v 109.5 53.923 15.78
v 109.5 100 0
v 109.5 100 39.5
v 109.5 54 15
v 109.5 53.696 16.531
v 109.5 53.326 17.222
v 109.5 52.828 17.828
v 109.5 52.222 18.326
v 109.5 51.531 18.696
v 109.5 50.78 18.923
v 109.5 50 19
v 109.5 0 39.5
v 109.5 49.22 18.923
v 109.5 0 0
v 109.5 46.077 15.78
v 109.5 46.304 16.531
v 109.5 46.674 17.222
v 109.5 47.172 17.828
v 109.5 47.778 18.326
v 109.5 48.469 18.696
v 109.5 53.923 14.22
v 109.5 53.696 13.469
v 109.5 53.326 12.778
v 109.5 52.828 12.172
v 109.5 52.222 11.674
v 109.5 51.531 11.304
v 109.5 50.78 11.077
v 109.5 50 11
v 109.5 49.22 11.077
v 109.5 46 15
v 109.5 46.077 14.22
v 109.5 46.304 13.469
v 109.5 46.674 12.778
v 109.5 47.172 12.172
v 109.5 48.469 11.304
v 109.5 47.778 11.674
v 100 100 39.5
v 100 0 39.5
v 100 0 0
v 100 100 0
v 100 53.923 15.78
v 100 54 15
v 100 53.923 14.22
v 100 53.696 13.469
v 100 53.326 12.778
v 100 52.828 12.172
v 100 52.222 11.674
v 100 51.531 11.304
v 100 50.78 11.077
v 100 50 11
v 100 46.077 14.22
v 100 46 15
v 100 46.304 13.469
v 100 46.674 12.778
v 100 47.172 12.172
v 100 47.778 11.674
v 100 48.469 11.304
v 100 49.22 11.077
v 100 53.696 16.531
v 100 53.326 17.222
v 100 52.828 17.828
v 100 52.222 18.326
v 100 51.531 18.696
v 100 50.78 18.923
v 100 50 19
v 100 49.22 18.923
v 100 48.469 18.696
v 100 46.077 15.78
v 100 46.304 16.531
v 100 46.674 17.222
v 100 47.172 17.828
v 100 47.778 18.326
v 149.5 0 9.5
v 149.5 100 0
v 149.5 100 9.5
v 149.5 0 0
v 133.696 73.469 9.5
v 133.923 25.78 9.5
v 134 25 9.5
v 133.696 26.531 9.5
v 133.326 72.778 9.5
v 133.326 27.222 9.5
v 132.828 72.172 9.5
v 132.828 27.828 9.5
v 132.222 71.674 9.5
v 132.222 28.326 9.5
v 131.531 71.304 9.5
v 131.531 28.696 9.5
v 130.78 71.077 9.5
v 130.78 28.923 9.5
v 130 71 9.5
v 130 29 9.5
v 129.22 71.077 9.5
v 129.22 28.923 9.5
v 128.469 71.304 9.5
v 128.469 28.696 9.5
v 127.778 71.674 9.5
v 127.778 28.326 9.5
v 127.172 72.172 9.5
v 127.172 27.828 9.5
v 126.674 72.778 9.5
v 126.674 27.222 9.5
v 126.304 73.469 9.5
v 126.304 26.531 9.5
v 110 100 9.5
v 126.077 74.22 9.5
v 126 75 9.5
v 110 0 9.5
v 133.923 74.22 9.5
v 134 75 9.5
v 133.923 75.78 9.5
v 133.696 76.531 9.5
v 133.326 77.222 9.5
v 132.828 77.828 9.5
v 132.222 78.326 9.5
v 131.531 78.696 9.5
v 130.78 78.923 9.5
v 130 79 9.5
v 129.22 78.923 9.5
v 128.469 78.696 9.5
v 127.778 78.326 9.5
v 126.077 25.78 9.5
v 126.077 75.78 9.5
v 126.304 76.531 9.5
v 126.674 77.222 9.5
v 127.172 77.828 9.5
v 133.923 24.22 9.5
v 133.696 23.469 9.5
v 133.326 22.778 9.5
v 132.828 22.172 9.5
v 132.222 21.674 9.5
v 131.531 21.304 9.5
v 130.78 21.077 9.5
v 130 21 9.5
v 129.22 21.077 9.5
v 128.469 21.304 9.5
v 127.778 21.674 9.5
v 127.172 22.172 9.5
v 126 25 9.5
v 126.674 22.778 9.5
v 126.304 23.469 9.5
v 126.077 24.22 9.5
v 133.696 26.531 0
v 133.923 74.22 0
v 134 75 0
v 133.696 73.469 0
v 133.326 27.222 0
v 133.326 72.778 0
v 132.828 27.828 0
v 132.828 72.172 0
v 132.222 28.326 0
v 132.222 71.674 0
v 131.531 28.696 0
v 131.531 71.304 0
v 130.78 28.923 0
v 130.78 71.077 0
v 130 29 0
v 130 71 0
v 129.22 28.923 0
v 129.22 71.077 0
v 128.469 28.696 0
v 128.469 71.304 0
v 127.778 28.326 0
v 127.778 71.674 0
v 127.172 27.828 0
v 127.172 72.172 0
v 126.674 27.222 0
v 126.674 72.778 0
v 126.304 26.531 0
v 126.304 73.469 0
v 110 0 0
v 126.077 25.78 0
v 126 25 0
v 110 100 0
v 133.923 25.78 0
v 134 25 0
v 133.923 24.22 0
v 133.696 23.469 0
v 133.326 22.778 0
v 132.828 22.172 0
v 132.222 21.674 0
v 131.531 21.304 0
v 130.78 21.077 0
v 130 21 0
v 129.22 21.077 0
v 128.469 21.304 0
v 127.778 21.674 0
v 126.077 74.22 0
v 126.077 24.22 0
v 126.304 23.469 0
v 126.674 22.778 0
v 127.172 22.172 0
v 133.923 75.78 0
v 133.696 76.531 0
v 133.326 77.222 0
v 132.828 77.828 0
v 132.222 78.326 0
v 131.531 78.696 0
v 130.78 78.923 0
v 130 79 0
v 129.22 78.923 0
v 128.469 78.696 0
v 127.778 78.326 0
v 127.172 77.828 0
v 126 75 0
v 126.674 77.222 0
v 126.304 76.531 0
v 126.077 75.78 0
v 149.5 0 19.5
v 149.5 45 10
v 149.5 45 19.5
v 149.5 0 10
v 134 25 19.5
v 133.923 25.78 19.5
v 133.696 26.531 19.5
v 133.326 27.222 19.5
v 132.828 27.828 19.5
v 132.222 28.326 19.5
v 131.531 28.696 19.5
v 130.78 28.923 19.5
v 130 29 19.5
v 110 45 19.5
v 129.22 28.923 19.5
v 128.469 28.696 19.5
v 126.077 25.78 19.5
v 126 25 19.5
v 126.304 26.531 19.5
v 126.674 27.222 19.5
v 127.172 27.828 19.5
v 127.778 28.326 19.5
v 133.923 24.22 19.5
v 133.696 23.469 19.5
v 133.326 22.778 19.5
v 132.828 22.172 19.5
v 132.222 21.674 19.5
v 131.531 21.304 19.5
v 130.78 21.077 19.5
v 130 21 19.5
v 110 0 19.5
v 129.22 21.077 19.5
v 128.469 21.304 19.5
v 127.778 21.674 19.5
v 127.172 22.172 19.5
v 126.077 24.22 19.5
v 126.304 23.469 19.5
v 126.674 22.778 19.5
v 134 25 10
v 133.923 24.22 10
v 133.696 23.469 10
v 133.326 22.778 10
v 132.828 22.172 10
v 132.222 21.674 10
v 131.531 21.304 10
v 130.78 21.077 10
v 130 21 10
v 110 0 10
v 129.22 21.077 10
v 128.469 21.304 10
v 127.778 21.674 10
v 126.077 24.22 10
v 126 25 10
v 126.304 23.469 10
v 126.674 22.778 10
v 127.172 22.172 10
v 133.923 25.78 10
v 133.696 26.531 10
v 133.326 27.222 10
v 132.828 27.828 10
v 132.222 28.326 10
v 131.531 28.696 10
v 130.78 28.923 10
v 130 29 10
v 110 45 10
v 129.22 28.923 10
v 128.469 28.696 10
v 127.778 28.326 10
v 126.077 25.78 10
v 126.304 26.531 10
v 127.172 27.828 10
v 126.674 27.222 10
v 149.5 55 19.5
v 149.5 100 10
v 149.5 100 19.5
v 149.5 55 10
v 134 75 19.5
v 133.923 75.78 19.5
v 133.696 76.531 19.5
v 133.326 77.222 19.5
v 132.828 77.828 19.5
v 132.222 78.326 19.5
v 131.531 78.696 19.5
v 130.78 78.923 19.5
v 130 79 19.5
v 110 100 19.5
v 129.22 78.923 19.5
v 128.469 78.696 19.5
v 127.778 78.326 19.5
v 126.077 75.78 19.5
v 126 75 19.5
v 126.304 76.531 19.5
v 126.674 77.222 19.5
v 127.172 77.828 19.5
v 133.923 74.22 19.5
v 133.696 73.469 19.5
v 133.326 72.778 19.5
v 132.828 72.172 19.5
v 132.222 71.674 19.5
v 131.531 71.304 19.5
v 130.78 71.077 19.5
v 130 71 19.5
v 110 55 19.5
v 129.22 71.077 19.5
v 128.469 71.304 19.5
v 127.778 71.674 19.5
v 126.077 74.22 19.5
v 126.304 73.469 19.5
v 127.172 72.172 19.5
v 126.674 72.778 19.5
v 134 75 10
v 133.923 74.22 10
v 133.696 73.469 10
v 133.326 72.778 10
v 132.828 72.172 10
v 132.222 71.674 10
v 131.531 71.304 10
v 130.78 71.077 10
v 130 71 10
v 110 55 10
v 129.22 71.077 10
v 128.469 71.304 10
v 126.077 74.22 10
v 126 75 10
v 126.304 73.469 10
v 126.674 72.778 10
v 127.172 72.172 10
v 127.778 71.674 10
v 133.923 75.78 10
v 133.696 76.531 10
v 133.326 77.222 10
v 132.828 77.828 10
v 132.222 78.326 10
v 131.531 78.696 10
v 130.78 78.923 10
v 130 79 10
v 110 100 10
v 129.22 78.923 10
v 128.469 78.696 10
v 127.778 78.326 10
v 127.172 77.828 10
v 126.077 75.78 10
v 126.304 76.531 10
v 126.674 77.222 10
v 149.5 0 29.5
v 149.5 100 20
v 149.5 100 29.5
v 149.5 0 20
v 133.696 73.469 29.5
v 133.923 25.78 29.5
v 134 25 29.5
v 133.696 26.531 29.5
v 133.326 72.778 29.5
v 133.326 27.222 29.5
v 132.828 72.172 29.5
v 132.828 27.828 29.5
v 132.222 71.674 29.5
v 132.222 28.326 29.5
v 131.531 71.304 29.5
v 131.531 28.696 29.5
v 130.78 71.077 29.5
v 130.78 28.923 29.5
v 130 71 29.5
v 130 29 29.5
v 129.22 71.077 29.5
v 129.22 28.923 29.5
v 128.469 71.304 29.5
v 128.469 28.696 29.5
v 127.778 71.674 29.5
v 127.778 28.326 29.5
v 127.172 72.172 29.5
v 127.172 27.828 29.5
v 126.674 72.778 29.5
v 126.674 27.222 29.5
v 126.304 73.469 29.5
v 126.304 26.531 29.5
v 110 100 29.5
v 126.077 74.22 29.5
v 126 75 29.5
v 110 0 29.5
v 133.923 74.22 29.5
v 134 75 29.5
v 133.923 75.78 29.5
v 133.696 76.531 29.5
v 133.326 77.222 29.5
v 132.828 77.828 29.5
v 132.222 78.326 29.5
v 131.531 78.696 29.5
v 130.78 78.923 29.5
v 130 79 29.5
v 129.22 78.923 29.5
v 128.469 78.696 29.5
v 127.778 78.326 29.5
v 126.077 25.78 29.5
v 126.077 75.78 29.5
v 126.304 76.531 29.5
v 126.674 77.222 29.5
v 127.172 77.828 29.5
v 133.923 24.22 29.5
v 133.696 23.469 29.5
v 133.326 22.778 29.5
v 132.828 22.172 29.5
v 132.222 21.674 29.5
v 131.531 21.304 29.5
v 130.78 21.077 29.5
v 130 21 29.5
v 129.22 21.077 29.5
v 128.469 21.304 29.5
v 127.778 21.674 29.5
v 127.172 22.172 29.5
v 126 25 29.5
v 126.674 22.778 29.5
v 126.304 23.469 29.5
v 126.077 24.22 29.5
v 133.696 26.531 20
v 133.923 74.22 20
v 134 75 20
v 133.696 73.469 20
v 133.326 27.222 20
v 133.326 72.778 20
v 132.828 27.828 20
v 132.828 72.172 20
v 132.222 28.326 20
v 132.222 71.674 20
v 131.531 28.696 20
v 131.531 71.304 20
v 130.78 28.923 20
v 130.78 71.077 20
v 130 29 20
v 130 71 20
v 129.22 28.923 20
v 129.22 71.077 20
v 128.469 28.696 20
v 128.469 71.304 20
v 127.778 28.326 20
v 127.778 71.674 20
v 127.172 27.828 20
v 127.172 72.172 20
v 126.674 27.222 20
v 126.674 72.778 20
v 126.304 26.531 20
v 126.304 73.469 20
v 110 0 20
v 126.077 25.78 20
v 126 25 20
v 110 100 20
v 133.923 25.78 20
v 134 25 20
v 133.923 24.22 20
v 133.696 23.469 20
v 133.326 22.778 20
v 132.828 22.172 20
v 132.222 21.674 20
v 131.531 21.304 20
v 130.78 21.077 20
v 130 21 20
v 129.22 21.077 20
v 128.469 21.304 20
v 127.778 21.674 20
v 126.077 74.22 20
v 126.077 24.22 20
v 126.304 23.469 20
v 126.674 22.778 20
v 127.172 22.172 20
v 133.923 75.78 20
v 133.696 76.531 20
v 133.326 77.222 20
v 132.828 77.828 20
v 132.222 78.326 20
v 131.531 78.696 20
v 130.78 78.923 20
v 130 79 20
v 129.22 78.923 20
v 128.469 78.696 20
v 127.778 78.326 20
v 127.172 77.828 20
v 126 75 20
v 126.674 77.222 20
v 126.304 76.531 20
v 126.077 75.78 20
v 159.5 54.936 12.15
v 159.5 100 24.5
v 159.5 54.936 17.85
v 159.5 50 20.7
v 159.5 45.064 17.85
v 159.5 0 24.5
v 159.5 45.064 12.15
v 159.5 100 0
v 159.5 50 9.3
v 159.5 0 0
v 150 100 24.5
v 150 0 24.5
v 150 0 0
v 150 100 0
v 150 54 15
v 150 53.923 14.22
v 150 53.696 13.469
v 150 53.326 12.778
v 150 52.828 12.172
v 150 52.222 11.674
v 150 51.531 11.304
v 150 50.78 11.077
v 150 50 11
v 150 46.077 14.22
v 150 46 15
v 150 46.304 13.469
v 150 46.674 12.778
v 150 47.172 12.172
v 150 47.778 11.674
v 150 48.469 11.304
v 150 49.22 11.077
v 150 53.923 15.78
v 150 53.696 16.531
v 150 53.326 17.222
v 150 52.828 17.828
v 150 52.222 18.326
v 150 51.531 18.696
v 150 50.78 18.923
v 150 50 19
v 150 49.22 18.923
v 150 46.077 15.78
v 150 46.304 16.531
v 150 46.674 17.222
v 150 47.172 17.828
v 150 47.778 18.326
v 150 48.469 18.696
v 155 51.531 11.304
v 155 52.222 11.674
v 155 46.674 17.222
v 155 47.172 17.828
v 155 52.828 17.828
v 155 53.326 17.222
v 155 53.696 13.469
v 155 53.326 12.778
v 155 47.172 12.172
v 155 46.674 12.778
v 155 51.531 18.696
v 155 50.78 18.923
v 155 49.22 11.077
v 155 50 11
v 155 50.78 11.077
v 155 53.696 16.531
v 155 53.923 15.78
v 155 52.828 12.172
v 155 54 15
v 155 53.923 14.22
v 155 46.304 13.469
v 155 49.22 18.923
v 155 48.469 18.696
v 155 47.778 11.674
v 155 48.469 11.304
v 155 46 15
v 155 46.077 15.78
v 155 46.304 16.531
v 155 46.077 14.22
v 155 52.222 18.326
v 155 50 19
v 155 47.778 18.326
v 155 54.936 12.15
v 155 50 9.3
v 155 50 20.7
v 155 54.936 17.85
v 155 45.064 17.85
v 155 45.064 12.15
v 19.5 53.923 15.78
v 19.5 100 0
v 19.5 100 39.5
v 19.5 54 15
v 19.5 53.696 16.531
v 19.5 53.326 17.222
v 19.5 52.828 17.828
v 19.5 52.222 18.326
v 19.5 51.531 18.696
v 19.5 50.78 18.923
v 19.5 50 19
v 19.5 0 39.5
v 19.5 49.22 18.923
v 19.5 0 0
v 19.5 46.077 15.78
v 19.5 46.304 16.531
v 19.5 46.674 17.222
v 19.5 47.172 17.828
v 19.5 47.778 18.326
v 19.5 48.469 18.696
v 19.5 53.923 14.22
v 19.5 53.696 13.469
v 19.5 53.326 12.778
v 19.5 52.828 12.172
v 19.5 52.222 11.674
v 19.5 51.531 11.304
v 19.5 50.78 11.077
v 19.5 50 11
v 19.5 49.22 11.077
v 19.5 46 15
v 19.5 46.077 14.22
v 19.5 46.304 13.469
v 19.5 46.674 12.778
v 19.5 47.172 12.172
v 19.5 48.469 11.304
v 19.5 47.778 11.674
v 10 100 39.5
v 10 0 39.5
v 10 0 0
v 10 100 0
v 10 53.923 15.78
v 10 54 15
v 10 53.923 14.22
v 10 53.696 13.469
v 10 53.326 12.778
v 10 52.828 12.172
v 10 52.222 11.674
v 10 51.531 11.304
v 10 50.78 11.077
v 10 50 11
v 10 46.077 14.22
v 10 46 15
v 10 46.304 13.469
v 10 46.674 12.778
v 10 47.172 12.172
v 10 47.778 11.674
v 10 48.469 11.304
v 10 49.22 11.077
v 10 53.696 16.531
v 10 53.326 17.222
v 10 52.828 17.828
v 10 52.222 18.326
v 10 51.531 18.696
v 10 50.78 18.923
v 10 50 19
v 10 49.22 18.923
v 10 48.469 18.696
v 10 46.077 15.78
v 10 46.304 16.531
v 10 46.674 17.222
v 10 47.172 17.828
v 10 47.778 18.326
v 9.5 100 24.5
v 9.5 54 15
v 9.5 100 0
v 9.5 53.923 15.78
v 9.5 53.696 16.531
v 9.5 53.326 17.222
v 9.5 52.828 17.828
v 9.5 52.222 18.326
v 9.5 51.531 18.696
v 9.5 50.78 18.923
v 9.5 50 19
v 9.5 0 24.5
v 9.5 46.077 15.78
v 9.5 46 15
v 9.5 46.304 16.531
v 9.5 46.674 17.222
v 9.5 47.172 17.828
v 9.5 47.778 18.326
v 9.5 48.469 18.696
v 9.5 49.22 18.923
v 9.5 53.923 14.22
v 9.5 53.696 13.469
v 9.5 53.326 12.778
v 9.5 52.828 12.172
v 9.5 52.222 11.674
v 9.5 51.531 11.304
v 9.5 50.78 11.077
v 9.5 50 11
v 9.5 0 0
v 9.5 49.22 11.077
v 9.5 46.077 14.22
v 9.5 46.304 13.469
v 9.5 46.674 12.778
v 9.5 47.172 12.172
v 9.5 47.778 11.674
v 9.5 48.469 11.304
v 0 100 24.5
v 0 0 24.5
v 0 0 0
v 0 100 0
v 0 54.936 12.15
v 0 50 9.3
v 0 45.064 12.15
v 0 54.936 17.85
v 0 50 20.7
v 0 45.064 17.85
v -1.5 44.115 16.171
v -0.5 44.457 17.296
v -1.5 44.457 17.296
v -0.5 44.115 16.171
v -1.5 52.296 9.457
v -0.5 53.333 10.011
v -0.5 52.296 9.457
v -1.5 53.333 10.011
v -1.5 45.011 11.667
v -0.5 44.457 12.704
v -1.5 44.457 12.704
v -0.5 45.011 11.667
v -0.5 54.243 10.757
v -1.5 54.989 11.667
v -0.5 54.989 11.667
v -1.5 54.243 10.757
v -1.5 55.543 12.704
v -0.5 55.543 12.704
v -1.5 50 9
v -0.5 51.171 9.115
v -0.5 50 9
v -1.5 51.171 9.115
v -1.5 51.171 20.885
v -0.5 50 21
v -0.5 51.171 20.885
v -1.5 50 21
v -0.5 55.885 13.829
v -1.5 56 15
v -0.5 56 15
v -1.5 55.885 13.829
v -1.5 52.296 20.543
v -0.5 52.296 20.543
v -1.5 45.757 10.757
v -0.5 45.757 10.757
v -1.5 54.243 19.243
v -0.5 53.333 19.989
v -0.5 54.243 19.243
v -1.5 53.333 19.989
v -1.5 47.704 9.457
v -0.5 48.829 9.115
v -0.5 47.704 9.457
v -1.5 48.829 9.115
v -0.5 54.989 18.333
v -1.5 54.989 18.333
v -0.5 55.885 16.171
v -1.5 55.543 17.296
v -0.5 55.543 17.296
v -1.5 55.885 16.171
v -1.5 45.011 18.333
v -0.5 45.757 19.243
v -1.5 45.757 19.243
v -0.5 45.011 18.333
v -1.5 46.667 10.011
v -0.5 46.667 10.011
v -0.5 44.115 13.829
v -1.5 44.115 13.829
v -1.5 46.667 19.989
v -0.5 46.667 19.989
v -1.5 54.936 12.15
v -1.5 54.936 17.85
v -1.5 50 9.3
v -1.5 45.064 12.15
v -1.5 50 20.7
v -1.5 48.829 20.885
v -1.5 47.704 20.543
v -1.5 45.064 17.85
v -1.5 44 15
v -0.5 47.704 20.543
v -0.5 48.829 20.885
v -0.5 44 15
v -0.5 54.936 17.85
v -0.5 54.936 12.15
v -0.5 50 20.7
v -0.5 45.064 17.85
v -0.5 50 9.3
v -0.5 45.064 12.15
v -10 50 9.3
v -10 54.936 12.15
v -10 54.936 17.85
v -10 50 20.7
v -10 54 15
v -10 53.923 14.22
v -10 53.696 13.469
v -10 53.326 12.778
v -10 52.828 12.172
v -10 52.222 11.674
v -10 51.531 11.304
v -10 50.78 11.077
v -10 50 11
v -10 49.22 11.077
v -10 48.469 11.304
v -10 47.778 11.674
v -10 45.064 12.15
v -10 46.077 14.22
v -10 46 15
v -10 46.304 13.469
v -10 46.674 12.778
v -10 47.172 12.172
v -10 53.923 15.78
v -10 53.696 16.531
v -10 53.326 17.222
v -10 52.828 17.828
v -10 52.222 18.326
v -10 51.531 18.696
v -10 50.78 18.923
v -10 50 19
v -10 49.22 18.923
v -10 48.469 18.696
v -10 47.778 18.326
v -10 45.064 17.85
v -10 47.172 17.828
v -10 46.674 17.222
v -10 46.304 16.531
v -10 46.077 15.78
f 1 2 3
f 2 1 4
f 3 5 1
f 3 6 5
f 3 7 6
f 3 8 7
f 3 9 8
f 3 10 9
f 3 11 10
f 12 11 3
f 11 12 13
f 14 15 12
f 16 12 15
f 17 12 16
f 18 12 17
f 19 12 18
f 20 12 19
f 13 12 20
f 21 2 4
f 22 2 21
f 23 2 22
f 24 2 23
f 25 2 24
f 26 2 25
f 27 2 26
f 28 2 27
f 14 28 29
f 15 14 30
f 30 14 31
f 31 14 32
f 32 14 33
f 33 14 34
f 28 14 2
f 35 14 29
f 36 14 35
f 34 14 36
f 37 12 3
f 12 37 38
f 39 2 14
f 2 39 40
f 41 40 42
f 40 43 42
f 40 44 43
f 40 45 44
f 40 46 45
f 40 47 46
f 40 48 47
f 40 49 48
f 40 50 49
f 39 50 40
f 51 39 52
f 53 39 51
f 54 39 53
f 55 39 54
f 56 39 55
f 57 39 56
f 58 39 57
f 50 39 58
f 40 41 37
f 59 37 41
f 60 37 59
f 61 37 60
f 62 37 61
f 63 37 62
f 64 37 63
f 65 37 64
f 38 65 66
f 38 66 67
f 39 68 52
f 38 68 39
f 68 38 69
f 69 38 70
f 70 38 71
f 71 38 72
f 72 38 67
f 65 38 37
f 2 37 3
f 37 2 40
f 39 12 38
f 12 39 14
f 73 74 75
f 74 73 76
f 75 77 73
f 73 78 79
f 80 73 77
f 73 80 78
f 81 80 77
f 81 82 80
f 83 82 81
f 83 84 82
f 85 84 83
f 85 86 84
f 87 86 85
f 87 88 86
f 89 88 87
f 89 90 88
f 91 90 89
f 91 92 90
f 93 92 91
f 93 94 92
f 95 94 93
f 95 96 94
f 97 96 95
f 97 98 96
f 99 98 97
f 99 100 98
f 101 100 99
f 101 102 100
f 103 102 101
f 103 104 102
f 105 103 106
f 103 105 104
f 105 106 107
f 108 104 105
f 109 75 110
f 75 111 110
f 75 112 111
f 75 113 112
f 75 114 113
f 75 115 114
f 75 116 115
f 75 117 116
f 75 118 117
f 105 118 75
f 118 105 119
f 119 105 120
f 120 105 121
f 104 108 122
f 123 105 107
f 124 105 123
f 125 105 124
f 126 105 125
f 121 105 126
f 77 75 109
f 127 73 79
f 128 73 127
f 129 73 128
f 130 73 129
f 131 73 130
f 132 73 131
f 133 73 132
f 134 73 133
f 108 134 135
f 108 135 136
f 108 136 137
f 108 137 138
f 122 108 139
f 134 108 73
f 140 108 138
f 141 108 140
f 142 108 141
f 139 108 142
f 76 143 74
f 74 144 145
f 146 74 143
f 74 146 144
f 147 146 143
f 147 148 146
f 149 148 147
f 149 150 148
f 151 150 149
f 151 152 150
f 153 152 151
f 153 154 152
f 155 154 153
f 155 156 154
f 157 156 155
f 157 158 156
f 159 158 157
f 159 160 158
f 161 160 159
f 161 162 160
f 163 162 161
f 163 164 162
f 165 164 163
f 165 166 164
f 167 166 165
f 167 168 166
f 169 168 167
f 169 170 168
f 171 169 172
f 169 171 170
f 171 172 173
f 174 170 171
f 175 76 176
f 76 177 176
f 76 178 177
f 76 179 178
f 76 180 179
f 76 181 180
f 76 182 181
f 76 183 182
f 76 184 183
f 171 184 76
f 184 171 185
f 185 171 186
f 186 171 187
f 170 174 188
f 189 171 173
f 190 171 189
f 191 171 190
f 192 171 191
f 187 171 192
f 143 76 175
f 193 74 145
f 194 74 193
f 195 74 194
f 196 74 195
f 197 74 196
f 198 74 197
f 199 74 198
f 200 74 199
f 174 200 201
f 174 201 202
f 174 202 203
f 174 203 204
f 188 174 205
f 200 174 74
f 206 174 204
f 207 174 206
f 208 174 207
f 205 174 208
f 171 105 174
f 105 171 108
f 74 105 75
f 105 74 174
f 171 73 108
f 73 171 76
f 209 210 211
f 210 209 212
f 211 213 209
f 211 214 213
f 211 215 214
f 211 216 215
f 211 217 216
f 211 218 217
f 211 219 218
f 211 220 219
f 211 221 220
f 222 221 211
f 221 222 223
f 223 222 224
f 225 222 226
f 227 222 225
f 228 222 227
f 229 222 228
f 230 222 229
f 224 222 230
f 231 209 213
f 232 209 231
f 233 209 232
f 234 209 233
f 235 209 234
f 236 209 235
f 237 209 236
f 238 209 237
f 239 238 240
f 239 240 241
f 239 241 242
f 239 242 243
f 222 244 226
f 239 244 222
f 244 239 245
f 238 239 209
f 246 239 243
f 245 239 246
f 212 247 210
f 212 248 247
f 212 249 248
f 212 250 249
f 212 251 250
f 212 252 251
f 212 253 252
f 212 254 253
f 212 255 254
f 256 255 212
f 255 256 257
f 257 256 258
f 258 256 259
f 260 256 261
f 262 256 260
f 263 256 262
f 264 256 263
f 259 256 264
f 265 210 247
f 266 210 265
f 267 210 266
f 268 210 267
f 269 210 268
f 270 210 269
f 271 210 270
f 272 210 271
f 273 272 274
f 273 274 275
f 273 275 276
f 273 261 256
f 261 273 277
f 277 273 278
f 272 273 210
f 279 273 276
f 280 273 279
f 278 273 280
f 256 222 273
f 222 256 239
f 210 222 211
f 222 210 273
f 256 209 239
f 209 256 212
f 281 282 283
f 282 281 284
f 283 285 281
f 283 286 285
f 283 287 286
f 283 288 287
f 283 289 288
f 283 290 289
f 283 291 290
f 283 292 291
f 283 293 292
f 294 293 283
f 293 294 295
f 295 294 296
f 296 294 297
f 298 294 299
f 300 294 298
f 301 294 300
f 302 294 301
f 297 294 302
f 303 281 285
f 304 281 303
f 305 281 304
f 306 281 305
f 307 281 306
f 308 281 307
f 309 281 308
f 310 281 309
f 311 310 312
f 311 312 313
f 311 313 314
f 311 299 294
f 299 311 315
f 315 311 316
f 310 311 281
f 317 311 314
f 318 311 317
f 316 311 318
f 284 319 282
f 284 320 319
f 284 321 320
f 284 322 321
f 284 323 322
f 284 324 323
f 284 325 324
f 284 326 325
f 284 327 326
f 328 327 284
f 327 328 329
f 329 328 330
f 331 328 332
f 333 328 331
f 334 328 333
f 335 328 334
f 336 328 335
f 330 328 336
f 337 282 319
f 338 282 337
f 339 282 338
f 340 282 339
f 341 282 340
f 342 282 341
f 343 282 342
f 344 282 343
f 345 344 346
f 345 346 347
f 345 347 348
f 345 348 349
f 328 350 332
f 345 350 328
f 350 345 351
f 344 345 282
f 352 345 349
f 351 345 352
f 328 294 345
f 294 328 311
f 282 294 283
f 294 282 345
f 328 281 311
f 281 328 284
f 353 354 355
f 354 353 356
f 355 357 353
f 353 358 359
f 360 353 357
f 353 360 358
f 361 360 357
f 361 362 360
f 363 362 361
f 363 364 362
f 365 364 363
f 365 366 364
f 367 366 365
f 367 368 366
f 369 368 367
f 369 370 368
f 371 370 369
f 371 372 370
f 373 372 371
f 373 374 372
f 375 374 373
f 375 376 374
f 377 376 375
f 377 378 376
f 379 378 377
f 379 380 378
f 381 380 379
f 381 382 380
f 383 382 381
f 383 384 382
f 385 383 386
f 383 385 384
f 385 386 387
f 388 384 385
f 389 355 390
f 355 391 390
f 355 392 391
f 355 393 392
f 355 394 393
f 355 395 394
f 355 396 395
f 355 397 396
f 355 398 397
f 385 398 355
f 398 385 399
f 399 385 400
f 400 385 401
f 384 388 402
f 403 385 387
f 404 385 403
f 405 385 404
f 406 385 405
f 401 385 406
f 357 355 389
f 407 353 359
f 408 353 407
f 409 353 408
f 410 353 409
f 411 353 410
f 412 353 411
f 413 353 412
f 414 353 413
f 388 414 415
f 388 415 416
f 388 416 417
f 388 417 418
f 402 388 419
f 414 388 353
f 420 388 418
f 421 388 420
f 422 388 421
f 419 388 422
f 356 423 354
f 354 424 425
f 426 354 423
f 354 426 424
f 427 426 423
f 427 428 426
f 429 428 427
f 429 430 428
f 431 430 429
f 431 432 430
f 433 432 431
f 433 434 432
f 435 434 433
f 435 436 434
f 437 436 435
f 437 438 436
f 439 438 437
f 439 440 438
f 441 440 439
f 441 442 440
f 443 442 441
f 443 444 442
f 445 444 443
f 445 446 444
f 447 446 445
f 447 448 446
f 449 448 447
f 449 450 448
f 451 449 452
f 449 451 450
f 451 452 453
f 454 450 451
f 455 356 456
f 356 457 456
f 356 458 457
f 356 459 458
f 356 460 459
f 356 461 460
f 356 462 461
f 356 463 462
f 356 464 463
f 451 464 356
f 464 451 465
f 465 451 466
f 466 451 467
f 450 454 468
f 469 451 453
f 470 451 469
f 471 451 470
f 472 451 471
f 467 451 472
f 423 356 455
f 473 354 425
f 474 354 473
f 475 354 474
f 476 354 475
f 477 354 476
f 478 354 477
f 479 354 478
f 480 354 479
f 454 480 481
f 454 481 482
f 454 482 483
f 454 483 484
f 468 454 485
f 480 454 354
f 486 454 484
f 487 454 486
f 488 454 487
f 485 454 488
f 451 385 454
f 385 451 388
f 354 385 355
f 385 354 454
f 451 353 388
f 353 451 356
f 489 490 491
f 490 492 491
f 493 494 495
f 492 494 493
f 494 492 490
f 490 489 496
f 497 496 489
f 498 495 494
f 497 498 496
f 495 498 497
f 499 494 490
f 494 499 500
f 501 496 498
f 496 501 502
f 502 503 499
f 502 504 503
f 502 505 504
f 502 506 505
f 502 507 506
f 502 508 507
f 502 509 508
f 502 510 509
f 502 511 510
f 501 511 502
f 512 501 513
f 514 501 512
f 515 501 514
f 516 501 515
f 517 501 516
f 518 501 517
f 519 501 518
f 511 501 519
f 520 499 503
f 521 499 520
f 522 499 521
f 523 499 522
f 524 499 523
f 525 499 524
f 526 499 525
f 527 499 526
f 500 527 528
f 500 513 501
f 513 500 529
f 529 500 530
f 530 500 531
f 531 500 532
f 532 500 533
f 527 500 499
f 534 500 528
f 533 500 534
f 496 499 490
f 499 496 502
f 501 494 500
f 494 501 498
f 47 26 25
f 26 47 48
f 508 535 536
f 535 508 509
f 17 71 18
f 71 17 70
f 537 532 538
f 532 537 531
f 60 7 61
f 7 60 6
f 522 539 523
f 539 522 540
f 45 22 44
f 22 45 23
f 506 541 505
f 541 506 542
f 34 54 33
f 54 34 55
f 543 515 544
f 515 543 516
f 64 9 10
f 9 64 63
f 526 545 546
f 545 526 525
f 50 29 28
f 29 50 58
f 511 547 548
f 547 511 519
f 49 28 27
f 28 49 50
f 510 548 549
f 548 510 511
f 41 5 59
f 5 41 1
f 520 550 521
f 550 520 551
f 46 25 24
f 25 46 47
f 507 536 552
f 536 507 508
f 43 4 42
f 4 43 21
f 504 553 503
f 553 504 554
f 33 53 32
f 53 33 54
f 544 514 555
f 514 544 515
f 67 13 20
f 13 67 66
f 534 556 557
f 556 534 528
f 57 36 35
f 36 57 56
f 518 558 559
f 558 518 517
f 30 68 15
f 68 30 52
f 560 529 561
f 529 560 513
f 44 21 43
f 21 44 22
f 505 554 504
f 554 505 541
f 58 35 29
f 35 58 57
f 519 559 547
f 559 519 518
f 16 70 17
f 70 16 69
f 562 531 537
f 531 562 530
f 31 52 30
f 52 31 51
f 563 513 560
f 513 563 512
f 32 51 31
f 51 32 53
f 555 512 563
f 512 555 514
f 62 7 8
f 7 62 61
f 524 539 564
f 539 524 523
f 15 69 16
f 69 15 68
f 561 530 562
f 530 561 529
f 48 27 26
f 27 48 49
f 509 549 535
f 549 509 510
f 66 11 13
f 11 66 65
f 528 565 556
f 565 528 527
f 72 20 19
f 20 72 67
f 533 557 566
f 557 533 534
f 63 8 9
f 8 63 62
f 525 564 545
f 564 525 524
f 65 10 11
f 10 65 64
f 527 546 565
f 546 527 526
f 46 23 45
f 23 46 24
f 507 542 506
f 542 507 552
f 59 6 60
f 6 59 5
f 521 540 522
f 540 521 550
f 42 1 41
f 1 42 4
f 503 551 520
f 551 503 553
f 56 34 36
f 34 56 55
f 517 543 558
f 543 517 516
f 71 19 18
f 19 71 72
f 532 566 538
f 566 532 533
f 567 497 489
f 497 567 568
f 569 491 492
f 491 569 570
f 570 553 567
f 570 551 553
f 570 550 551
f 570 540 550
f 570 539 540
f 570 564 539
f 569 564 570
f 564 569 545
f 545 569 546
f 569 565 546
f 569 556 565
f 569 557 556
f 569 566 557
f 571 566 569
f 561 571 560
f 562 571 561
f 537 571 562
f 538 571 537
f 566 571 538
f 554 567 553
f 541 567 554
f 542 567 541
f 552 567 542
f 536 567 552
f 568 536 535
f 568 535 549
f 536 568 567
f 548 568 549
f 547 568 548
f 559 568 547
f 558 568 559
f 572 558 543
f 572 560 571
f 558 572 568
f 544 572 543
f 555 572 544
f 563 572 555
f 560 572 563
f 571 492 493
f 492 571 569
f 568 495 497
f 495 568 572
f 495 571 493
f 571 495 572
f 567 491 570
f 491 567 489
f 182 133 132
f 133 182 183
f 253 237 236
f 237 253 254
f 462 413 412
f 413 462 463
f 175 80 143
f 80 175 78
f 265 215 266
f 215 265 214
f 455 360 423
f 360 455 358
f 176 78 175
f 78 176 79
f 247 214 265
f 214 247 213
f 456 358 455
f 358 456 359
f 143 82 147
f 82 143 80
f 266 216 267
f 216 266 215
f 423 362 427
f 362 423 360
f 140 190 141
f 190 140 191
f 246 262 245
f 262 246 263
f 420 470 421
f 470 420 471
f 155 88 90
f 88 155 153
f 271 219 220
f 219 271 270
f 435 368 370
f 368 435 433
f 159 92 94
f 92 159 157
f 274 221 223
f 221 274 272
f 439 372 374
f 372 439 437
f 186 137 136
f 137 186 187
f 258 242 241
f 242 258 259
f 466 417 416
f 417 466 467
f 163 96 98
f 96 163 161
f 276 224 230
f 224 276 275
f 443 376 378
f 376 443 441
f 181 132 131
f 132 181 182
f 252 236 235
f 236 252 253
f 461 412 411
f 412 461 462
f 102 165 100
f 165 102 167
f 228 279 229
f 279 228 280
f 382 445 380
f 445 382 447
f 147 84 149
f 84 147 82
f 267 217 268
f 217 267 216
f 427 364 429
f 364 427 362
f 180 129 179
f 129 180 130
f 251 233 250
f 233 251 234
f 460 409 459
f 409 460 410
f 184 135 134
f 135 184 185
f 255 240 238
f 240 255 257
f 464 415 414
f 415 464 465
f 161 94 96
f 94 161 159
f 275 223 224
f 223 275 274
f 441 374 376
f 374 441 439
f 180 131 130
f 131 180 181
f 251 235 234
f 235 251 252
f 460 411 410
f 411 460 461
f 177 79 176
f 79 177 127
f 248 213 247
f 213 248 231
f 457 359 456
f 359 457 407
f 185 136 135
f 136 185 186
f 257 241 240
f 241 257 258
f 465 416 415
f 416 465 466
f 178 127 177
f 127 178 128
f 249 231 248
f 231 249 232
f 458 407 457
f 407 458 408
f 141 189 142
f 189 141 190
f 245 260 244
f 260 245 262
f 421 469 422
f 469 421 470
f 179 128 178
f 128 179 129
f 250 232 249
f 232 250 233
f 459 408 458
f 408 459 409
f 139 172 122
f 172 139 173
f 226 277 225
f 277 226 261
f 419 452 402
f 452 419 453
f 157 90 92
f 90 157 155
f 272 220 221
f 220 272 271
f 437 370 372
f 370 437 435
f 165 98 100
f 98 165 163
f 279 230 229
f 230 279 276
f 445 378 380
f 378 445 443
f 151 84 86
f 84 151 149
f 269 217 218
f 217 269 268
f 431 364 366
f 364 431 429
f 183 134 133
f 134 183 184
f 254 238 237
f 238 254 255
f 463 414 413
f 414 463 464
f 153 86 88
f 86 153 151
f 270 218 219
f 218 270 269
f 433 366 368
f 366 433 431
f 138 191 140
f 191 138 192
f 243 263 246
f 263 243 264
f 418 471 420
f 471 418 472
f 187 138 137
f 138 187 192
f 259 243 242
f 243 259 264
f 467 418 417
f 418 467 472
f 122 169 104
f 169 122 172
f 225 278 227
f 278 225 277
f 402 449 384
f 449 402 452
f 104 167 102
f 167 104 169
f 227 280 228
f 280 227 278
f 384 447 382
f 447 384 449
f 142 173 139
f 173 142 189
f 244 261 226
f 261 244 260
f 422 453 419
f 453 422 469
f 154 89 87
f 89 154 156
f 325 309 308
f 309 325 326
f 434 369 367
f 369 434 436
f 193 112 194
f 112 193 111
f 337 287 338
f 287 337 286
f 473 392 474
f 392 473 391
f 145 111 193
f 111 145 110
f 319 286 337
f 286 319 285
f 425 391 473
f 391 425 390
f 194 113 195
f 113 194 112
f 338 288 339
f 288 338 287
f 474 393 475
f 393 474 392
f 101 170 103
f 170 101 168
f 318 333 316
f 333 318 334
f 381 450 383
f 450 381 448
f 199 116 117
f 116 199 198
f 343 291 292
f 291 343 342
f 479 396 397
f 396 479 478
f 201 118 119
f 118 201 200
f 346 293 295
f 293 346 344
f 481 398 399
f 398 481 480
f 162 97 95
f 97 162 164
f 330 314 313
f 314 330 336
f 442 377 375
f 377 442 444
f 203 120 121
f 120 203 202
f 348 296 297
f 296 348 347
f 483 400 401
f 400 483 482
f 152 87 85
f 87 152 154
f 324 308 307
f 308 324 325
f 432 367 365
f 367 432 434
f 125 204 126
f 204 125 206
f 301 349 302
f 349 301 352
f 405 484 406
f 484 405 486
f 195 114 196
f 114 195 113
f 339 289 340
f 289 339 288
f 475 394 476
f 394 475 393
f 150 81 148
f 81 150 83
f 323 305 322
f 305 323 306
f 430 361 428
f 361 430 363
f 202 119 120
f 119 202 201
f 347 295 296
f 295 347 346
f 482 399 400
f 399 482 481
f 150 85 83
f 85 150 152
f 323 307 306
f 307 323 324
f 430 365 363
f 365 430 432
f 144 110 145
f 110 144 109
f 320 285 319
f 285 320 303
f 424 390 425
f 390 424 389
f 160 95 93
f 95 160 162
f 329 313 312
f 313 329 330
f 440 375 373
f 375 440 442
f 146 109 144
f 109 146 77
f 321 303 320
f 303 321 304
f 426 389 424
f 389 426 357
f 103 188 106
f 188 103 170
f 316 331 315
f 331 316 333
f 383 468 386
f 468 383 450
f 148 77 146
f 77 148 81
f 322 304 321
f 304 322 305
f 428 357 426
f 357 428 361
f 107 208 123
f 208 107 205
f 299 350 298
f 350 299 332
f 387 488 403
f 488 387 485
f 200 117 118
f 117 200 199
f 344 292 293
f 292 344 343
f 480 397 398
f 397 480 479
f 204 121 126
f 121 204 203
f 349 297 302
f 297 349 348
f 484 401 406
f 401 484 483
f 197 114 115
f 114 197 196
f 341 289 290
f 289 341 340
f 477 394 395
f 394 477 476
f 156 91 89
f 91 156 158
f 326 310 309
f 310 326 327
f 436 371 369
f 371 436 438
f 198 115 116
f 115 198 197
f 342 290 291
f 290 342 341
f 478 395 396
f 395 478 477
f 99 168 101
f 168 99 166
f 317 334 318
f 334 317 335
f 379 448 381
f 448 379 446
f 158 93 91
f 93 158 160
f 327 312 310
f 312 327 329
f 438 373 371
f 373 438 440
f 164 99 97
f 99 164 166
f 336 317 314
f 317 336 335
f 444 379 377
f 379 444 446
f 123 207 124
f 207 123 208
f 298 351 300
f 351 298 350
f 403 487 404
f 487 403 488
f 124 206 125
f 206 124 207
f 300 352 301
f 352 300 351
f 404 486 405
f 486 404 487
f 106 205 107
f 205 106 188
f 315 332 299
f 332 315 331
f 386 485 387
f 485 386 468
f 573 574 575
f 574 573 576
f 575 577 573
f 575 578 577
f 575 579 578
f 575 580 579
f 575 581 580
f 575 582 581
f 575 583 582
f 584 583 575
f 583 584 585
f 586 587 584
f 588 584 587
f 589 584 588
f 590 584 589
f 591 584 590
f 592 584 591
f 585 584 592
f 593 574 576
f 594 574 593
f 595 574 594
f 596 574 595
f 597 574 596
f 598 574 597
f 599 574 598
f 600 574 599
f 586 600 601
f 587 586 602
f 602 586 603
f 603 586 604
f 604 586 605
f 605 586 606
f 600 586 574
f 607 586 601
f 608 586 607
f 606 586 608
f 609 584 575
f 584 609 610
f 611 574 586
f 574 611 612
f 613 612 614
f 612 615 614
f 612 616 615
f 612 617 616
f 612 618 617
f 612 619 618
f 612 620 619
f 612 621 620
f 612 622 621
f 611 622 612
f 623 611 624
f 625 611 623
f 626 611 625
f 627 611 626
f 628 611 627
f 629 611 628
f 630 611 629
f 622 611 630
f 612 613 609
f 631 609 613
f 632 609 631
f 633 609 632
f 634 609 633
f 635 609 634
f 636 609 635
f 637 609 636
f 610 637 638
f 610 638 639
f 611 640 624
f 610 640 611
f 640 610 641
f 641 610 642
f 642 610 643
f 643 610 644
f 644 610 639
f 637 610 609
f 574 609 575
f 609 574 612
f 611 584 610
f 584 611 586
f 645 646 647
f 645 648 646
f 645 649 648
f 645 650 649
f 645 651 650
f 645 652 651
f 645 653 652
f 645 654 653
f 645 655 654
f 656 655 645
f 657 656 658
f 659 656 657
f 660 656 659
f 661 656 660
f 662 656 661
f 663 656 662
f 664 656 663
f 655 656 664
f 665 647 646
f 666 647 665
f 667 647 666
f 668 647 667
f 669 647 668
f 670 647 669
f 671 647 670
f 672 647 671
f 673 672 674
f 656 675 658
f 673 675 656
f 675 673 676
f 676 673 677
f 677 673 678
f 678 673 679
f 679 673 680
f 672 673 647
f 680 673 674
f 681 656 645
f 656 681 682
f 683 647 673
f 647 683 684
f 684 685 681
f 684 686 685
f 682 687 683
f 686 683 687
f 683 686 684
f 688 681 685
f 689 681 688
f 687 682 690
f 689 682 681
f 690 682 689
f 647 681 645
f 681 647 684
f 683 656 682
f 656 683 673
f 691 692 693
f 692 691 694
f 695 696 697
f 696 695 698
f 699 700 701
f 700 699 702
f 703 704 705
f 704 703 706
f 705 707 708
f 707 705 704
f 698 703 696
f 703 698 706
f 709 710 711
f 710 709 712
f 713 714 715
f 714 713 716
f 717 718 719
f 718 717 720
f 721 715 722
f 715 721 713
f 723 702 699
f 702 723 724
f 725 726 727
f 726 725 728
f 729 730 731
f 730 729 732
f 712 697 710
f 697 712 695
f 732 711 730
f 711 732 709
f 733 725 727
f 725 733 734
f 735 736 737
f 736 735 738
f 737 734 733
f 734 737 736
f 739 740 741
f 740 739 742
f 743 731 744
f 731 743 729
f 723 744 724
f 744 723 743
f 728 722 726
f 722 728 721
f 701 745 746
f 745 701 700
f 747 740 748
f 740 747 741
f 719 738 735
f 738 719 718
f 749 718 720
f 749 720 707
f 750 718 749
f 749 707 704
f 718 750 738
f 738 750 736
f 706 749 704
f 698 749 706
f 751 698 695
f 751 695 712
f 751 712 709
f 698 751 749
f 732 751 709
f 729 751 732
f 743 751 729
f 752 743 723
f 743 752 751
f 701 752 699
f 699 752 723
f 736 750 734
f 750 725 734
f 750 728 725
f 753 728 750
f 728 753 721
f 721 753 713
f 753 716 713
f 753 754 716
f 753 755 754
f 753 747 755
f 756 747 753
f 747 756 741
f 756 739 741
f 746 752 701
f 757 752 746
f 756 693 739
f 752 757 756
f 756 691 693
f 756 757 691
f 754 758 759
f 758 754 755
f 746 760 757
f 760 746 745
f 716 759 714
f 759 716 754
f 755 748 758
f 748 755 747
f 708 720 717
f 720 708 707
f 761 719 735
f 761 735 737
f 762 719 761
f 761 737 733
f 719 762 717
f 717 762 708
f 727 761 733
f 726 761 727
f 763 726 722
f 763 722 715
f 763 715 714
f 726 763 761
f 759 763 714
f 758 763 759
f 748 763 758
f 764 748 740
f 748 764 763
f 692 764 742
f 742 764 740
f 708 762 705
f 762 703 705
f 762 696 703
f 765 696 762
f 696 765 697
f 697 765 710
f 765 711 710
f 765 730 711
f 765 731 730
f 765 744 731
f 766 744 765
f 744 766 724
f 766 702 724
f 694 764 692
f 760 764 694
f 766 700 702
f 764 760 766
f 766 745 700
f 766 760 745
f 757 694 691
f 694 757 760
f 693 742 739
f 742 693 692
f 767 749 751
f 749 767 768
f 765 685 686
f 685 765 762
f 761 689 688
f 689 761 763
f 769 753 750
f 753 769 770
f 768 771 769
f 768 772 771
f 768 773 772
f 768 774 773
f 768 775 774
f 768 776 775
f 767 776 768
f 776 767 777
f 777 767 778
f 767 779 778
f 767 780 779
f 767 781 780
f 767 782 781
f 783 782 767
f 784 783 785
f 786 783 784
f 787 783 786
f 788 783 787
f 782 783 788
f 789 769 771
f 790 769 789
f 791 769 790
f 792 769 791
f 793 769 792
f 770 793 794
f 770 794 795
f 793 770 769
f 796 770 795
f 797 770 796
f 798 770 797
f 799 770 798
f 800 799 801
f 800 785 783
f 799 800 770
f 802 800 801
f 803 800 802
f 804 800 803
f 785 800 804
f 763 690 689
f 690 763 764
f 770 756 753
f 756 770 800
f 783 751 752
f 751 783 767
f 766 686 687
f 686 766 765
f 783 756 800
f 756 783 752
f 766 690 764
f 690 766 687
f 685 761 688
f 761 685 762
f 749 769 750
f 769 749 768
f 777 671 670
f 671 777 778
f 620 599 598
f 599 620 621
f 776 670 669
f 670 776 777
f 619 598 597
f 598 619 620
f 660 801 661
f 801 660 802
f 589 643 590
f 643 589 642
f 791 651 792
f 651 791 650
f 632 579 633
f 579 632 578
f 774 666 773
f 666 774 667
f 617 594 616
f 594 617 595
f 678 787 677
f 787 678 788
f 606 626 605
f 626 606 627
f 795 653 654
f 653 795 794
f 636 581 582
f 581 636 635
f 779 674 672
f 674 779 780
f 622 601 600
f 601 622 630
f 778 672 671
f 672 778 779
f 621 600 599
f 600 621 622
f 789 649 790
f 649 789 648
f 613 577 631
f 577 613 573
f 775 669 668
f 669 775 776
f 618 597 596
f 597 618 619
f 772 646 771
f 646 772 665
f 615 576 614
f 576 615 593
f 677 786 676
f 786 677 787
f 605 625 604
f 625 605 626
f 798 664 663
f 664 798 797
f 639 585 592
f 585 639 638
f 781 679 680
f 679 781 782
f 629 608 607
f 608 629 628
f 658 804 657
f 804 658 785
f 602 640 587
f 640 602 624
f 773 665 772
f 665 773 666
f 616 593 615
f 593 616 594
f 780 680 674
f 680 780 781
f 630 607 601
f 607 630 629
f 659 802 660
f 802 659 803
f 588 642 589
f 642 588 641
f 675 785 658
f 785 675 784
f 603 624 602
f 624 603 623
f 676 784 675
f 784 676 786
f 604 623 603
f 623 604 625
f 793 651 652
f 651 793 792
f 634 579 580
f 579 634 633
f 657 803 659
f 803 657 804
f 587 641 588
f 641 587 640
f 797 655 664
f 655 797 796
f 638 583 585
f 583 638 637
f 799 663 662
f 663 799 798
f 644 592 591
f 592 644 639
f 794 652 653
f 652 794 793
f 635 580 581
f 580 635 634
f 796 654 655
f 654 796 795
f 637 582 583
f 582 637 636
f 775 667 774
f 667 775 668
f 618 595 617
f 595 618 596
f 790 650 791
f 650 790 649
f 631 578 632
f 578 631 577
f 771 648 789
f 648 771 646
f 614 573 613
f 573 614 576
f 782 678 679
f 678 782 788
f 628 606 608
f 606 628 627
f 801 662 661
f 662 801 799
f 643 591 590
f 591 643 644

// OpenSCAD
/**
 * Martin Egli
 * 2022-07-07
 */

module h40x10(len = 150) {
    cube([40-0.5, len, 10-0.5]);
}
module h10x40(len = 150) {
    cube([10-0.5, len, 40-0.5]);
}

module h10x25(len = 150) {
    cube([10-0.5, len, 25-0.5]);
}
module zwinge1(len = 100, loc_res = 32) {
    difference() {
        union() {
            translate([0, 0, 0])
            h10x40(len);
            translate([10, 0, 0])
            h40x10(len);
            translate([10, 0, 10])
            h40x10(len/2-5);
            translate([10, len/2+5, 10])
            h40x10(len/2-5);
            translate([10, 0, 20])
            h40x10(len);

            translate([50, 0, 0])
            h10x25(len);
        }
        #translate([-15, len/2, 15])
        rotate([0, 90, 0])
        cylinder(d = 8, h = 100, $fn = loc_res);
        #translate([55, len/2, 15])
        rotate([0, 90, 0])
        cylinder(r = 5.7, h = 10, $fn = 6);
        
        #translate([30, 1/4*len, -5])
        cylinder(d = 8, h = 50, $fn = loc_res);
        #translate([30, 3/4*len, -5])
        cylinder(d = 8, h = 50, $fn = loc_res);
    }
}

module zwinge2(len = 100, loc_res = 32) {
    difference() {
        union() {
            translate([10, 0, 0])
            h10x40(len);
            translate([0, 0, 0])
            h10x25(len);
            
            #translate([-1.5, len/2, 15])
            rotate([0, 90, 0])
            cylinder(d = 12, h = 1, $fn = loc_res);
            
            #translate([-10, len/2, 15])
            rotate([0, 90, 0])
            cylinder(r = 5.7, h = 10, $fn = 6);
        }
        #translate([-10, len/2, 15])
        rotate([0, 90, 0])
        cylinder(d = 8, h = 40, $fn = loc_res);
    }
}

translate([100, 0, 0])
zwinge1();

translate([-0, 0, 0])
zwinge2();
